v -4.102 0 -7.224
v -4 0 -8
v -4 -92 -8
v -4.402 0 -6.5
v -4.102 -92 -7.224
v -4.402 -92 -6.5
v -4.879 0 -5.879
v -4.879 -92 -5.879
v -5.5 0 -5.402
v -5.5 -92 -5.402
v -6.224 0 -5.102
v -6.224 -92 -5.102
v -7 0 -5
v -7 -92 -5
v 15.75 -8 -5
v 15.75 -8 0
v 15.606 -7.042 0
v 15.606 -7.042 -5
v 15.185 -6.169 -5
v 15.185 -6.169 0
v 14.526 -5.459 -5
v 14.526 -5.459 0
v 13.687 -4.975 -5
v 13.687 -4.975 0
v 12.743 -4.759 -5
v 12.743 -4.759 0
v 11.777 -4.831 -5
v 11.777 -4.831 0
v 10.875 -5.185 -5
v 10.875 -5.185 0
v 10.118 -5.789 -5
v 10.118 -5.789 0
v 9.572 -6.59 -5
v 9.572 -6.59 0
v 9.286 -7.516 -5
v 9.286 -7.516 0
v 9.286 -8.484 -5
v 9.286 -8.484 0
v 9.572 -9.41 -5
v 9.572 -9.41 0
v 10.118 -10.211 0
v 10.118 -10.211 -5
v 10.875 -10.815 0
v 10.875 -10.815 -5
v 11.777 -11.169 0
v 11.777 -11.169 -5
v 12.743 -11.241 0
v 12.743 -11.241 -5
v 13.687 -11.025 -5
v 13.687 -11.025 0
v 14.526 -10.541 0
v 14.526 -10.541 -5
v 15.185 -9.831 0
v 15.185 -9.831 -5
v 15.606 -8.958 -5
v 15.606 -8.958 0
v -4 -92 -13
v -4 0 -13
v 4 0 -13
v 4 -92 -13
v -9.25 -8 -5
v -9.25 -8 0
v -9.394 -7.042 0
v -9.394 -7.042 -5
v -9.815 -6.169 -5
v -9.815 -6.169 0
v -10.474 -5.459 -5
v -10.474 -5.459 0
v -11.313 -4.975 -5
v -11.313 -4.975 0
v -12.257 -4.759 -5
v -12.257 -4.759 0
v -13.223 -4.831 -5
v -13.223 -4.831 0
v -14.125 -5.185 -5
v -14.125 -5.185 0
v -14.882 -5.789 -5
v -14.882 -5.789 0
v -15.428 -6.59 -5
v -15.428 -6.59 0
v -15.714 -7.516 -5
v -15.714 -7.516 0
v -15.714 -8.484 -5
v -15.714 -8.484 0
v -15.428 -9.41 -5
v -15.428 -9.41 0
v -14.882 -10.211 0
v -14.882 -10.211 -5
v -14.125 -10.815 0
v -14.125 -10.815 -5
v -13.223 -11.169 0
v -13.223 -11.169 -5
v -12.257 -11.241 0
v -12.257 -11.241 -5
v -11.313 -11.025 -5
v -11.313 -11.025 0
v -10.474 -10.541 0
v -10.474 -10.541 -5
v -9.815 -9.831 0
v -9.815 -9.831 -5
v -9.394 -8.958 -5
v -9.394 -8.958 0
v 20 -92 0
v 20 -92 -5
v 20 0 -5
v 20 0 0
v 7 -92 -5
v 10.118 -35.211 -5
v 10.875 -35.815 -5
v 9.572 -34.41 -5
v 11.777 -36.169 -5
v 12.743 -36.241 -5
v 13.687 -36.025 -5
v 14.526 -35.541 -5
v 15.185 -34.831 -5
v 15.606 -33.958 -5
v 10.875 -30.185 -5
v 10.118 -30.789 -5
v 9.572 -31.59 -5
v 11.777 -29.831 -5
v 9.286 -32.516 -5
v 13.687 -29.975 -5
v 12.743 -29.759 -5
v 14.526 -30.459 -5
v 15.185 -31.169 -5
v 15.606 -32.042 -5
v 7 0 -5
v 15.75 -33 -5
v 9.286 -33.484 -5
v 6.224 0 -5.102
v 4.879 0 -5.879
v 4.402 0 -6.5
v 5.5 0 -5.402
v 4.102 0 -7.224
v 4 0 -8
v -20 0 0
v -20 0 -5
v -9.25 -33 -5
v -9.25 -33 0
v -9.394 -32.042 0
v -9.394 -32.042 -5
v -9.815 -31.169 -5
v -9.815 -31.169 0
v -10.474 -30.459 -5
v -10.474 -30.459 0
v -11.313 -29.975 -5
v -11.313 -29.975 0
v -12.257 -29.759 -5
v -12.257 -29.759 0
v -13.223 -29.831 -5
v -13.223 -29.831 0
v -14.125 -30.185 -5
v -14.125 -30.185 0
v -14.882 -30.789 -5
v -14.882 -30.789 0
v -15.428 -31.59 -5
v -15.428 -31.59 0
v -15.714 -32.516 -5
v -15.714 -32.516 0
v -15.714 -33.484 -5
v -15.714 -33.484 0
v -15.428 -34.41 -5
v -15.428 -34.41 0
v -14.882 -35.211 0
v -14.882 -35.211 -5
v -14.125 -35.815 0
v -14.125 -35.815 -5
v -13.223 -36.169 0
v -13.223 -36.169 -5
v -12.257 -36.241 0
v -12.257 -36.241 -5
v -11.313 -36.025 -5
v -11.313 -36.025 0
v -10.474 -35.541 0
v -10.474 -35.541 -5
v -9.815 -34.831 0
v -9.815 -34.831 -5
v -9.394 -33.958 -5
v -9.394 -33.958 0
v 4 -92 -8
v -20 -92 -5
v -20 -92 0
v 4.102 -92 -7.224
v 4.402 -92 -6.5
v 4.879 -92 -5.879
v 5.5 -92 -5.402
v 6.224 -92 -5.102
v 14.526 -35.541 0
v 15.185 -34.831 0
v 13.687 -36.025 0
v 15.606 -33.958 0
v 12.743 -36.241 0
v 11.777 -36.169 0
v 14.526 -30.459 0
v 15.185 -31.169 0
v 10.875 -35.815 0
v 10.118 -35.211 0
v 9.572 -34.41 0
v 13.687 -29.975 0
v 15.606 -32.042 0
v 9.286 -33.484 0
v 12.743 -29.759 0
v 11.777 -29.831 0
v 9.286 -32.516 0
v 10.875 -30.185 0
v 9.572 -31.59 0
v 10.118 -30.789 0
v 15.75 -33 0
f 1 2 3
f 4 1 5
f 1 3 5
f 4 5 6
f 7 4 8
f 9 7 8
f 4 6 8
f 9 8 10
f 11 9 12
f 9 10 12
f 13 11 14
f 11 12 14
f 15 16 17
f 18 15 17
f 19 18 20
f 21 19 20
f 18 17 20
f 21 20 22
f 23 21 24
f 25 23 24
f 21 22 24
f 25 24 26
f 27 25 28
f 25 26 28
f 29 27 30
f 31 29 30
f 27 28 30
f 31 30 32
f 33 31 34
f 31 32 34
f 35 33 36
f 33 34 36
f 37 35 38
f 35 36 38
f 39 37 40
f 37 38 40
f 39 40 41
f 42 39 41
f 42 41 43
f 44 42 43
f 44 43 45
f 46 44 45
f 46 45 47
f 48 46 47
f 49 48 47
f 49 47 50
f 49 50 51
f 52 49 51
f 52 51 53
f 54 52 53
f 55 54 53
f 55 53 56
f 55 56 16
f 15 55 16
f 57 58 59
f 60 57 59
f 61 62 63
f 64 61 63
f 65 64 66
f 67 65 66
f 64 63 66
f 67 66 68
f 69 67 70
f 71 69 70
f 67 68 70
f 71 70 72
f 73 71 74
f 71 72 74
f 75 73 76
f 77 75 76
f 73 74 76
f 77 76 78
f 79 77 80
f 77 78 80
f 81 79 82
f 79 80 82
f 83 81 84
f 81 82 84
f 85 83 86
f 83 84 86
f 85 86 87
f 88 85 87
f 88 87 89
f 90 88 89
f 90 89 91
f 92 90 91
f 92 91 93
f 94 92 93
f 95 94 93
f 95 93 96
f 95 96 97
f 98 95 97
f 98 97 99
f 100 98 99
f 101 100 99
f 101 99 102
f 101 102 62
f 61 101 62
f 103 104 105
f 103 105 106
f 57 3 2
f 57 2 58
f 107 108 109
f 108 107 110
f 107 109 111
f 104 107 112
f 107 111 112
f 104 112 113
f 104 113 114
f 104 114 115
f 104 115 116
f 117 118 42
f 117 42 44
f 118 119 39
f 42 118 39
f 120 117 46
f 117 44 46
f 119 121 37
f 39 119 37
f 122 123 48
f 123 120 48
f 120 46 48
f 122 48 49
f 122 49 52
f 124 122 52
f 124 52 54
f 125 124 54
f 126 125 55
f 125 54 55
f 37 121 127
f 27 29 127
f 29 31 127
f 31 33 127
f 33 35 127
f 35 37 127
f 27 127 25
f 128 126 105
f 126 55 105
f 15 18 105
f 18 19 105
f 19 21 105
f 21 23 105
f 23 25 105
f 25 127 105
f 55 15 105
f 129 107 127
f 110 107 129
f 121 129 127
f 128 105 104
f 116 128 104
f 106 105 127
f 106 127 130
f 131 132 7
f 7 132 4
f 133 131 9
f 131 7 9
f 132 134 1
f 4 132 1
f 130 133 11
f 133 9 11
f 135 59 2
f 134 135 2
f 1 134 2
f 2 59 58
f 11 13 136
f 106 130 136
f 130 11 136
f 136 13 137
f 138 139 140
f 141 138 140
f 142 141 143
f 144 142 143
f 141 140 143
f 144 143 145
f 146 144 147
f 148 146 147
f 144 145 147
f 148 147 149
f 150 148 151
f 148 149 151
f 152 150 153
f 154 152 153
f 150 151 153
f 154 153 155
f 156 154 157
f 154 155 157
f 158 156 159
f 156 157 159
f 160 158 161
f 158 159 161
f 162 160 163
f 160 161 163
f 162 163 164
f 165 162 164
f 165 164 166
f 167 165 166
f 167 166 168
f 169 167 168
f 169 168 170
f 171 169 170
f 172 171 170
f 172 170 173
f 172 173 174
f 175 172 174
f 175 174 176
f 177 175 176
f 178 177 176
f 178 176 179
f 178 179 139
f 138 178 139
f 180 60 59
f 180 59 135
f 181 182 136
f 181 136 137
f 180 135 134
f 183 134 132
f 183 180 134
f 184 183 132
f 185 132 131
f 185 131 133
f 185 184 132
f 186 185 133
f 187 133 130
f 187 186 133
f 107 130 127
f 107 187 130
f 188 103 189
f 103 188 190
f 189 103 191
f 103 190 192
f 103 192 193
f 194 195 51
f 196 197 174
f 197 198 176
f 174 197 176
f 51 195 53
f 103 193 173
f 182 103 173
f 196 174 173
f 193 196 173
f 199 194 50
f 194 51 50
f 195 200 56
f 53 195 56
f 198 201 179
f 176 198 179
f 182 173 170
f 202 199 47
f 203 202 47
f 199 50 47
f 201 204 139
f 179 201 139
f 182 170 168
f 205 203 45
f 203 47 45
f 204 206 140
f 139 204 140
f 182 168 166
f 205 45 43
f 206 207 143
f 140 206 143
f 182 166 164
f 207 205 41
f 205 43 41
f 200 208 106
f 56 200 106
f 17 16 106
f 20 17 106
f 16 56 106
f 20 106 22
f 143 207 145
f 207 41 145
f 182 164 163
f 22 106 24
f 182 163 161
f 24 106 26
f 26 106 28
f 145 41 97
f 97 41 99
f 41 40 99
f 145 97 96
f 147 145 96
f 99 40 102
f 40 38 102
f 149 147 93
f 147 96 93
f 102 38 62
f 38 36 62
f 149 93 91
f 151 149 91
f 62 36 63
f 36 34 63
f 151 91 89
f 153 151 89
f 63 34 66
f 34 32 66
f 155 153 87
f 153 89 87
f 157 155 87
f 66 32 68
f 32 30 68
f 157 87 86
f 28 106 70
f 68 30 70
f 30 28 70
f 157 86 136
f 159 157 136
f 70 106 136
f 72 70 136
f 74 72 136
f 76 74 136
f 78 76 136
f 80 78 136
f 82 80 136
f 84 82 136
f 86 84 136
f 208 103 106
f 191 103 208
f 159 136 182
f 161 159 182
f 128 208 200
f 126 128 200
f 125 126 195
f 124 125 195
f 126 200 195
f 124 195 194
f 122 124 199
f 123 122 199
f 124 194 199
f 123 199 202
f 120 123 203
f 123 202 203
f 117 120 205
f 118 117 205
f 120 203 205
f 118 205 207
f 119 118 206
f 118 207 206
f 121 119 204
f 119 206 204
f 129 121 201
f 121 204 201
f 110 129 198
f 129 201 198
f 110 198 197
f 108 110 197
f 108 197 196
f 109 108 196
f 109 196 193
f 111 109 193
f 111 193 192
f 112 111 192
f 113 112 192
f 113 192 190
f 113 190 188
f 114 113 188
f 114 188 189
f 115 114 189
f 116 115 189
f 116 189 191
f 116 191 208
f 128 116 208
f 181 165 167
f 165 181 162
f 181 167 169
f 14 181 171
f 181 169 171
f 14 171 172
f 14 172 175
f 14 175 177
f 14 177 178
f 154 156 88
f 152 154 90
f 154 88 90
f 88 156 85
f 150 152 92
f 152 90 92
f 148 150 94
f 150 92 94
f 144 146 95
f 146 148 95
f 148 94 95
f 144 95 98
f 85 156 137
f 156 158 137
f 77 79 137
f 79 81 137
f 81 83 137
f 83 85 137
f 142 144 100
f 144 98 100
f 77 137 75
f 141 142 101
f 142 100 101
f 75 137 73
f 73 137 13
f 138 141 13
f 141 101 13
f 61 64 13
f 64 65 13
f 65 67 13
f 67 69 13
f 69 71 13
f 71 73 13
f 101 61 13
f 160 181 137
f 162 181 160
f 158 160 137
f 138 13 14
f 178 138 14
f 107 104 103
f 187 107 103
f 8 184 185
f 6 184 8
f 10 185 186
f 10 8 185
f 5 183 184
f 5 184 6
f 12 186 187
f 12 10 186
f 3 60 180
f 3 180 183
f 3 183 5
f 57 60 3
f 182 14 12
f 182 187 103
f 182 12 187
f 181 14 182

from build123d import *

# Parameters (mm, degrees)
BOSS_EXTRUDE1_DEPTH = 92
FILLET1_R           = 3
SKETCH2_R           = 3.25
CUT_EXTRUDE1_DEPTH  = 92


with BuildPart() as part:
    # Sketch1 → Boss-Extrude1 (new body)
    with BuildSketch(Plane(origin=(0, 0, 0), x_dir=(1, 0, 0), z_dir=(0, 1, 0))):
        Polygon((-4, 5), (-4, 13), (4, 13), (4, 5), (20, 5), (20, 0), (-20, 0), (-20, 5), align=None)
    extrude(amount=-BOSS_EXTRUDE1_DEPTH)

    # Fillet1
    fillet1_edges = [part.edges().sort_by_distance(p)[0] for p in [
        (-4, -46, -5),
        (4, -46, -5),
    ]]
    fillet(fillet1_edges, radius=FILLET1_R)

    # Sketch2 → Cut-Extrude1 (cut)
    with BuildSketch(Plane.XY):
        with Locations((12.5, -8)):
            Circle(SKETCH2_R)
        with Locations((12.5, -33)):
            Circle(SKETCH2_R)
        with Locations((-12.5, -33)):
            Circle(SKETCH2_R)
        with Locations((-12.5, -8)):
            Circle(SKETCH2_R)
    extrude(amount=-CUT_EXTRUDE1_DEPTH, mode=Mode.SUBTRACT)


solid = part.part
